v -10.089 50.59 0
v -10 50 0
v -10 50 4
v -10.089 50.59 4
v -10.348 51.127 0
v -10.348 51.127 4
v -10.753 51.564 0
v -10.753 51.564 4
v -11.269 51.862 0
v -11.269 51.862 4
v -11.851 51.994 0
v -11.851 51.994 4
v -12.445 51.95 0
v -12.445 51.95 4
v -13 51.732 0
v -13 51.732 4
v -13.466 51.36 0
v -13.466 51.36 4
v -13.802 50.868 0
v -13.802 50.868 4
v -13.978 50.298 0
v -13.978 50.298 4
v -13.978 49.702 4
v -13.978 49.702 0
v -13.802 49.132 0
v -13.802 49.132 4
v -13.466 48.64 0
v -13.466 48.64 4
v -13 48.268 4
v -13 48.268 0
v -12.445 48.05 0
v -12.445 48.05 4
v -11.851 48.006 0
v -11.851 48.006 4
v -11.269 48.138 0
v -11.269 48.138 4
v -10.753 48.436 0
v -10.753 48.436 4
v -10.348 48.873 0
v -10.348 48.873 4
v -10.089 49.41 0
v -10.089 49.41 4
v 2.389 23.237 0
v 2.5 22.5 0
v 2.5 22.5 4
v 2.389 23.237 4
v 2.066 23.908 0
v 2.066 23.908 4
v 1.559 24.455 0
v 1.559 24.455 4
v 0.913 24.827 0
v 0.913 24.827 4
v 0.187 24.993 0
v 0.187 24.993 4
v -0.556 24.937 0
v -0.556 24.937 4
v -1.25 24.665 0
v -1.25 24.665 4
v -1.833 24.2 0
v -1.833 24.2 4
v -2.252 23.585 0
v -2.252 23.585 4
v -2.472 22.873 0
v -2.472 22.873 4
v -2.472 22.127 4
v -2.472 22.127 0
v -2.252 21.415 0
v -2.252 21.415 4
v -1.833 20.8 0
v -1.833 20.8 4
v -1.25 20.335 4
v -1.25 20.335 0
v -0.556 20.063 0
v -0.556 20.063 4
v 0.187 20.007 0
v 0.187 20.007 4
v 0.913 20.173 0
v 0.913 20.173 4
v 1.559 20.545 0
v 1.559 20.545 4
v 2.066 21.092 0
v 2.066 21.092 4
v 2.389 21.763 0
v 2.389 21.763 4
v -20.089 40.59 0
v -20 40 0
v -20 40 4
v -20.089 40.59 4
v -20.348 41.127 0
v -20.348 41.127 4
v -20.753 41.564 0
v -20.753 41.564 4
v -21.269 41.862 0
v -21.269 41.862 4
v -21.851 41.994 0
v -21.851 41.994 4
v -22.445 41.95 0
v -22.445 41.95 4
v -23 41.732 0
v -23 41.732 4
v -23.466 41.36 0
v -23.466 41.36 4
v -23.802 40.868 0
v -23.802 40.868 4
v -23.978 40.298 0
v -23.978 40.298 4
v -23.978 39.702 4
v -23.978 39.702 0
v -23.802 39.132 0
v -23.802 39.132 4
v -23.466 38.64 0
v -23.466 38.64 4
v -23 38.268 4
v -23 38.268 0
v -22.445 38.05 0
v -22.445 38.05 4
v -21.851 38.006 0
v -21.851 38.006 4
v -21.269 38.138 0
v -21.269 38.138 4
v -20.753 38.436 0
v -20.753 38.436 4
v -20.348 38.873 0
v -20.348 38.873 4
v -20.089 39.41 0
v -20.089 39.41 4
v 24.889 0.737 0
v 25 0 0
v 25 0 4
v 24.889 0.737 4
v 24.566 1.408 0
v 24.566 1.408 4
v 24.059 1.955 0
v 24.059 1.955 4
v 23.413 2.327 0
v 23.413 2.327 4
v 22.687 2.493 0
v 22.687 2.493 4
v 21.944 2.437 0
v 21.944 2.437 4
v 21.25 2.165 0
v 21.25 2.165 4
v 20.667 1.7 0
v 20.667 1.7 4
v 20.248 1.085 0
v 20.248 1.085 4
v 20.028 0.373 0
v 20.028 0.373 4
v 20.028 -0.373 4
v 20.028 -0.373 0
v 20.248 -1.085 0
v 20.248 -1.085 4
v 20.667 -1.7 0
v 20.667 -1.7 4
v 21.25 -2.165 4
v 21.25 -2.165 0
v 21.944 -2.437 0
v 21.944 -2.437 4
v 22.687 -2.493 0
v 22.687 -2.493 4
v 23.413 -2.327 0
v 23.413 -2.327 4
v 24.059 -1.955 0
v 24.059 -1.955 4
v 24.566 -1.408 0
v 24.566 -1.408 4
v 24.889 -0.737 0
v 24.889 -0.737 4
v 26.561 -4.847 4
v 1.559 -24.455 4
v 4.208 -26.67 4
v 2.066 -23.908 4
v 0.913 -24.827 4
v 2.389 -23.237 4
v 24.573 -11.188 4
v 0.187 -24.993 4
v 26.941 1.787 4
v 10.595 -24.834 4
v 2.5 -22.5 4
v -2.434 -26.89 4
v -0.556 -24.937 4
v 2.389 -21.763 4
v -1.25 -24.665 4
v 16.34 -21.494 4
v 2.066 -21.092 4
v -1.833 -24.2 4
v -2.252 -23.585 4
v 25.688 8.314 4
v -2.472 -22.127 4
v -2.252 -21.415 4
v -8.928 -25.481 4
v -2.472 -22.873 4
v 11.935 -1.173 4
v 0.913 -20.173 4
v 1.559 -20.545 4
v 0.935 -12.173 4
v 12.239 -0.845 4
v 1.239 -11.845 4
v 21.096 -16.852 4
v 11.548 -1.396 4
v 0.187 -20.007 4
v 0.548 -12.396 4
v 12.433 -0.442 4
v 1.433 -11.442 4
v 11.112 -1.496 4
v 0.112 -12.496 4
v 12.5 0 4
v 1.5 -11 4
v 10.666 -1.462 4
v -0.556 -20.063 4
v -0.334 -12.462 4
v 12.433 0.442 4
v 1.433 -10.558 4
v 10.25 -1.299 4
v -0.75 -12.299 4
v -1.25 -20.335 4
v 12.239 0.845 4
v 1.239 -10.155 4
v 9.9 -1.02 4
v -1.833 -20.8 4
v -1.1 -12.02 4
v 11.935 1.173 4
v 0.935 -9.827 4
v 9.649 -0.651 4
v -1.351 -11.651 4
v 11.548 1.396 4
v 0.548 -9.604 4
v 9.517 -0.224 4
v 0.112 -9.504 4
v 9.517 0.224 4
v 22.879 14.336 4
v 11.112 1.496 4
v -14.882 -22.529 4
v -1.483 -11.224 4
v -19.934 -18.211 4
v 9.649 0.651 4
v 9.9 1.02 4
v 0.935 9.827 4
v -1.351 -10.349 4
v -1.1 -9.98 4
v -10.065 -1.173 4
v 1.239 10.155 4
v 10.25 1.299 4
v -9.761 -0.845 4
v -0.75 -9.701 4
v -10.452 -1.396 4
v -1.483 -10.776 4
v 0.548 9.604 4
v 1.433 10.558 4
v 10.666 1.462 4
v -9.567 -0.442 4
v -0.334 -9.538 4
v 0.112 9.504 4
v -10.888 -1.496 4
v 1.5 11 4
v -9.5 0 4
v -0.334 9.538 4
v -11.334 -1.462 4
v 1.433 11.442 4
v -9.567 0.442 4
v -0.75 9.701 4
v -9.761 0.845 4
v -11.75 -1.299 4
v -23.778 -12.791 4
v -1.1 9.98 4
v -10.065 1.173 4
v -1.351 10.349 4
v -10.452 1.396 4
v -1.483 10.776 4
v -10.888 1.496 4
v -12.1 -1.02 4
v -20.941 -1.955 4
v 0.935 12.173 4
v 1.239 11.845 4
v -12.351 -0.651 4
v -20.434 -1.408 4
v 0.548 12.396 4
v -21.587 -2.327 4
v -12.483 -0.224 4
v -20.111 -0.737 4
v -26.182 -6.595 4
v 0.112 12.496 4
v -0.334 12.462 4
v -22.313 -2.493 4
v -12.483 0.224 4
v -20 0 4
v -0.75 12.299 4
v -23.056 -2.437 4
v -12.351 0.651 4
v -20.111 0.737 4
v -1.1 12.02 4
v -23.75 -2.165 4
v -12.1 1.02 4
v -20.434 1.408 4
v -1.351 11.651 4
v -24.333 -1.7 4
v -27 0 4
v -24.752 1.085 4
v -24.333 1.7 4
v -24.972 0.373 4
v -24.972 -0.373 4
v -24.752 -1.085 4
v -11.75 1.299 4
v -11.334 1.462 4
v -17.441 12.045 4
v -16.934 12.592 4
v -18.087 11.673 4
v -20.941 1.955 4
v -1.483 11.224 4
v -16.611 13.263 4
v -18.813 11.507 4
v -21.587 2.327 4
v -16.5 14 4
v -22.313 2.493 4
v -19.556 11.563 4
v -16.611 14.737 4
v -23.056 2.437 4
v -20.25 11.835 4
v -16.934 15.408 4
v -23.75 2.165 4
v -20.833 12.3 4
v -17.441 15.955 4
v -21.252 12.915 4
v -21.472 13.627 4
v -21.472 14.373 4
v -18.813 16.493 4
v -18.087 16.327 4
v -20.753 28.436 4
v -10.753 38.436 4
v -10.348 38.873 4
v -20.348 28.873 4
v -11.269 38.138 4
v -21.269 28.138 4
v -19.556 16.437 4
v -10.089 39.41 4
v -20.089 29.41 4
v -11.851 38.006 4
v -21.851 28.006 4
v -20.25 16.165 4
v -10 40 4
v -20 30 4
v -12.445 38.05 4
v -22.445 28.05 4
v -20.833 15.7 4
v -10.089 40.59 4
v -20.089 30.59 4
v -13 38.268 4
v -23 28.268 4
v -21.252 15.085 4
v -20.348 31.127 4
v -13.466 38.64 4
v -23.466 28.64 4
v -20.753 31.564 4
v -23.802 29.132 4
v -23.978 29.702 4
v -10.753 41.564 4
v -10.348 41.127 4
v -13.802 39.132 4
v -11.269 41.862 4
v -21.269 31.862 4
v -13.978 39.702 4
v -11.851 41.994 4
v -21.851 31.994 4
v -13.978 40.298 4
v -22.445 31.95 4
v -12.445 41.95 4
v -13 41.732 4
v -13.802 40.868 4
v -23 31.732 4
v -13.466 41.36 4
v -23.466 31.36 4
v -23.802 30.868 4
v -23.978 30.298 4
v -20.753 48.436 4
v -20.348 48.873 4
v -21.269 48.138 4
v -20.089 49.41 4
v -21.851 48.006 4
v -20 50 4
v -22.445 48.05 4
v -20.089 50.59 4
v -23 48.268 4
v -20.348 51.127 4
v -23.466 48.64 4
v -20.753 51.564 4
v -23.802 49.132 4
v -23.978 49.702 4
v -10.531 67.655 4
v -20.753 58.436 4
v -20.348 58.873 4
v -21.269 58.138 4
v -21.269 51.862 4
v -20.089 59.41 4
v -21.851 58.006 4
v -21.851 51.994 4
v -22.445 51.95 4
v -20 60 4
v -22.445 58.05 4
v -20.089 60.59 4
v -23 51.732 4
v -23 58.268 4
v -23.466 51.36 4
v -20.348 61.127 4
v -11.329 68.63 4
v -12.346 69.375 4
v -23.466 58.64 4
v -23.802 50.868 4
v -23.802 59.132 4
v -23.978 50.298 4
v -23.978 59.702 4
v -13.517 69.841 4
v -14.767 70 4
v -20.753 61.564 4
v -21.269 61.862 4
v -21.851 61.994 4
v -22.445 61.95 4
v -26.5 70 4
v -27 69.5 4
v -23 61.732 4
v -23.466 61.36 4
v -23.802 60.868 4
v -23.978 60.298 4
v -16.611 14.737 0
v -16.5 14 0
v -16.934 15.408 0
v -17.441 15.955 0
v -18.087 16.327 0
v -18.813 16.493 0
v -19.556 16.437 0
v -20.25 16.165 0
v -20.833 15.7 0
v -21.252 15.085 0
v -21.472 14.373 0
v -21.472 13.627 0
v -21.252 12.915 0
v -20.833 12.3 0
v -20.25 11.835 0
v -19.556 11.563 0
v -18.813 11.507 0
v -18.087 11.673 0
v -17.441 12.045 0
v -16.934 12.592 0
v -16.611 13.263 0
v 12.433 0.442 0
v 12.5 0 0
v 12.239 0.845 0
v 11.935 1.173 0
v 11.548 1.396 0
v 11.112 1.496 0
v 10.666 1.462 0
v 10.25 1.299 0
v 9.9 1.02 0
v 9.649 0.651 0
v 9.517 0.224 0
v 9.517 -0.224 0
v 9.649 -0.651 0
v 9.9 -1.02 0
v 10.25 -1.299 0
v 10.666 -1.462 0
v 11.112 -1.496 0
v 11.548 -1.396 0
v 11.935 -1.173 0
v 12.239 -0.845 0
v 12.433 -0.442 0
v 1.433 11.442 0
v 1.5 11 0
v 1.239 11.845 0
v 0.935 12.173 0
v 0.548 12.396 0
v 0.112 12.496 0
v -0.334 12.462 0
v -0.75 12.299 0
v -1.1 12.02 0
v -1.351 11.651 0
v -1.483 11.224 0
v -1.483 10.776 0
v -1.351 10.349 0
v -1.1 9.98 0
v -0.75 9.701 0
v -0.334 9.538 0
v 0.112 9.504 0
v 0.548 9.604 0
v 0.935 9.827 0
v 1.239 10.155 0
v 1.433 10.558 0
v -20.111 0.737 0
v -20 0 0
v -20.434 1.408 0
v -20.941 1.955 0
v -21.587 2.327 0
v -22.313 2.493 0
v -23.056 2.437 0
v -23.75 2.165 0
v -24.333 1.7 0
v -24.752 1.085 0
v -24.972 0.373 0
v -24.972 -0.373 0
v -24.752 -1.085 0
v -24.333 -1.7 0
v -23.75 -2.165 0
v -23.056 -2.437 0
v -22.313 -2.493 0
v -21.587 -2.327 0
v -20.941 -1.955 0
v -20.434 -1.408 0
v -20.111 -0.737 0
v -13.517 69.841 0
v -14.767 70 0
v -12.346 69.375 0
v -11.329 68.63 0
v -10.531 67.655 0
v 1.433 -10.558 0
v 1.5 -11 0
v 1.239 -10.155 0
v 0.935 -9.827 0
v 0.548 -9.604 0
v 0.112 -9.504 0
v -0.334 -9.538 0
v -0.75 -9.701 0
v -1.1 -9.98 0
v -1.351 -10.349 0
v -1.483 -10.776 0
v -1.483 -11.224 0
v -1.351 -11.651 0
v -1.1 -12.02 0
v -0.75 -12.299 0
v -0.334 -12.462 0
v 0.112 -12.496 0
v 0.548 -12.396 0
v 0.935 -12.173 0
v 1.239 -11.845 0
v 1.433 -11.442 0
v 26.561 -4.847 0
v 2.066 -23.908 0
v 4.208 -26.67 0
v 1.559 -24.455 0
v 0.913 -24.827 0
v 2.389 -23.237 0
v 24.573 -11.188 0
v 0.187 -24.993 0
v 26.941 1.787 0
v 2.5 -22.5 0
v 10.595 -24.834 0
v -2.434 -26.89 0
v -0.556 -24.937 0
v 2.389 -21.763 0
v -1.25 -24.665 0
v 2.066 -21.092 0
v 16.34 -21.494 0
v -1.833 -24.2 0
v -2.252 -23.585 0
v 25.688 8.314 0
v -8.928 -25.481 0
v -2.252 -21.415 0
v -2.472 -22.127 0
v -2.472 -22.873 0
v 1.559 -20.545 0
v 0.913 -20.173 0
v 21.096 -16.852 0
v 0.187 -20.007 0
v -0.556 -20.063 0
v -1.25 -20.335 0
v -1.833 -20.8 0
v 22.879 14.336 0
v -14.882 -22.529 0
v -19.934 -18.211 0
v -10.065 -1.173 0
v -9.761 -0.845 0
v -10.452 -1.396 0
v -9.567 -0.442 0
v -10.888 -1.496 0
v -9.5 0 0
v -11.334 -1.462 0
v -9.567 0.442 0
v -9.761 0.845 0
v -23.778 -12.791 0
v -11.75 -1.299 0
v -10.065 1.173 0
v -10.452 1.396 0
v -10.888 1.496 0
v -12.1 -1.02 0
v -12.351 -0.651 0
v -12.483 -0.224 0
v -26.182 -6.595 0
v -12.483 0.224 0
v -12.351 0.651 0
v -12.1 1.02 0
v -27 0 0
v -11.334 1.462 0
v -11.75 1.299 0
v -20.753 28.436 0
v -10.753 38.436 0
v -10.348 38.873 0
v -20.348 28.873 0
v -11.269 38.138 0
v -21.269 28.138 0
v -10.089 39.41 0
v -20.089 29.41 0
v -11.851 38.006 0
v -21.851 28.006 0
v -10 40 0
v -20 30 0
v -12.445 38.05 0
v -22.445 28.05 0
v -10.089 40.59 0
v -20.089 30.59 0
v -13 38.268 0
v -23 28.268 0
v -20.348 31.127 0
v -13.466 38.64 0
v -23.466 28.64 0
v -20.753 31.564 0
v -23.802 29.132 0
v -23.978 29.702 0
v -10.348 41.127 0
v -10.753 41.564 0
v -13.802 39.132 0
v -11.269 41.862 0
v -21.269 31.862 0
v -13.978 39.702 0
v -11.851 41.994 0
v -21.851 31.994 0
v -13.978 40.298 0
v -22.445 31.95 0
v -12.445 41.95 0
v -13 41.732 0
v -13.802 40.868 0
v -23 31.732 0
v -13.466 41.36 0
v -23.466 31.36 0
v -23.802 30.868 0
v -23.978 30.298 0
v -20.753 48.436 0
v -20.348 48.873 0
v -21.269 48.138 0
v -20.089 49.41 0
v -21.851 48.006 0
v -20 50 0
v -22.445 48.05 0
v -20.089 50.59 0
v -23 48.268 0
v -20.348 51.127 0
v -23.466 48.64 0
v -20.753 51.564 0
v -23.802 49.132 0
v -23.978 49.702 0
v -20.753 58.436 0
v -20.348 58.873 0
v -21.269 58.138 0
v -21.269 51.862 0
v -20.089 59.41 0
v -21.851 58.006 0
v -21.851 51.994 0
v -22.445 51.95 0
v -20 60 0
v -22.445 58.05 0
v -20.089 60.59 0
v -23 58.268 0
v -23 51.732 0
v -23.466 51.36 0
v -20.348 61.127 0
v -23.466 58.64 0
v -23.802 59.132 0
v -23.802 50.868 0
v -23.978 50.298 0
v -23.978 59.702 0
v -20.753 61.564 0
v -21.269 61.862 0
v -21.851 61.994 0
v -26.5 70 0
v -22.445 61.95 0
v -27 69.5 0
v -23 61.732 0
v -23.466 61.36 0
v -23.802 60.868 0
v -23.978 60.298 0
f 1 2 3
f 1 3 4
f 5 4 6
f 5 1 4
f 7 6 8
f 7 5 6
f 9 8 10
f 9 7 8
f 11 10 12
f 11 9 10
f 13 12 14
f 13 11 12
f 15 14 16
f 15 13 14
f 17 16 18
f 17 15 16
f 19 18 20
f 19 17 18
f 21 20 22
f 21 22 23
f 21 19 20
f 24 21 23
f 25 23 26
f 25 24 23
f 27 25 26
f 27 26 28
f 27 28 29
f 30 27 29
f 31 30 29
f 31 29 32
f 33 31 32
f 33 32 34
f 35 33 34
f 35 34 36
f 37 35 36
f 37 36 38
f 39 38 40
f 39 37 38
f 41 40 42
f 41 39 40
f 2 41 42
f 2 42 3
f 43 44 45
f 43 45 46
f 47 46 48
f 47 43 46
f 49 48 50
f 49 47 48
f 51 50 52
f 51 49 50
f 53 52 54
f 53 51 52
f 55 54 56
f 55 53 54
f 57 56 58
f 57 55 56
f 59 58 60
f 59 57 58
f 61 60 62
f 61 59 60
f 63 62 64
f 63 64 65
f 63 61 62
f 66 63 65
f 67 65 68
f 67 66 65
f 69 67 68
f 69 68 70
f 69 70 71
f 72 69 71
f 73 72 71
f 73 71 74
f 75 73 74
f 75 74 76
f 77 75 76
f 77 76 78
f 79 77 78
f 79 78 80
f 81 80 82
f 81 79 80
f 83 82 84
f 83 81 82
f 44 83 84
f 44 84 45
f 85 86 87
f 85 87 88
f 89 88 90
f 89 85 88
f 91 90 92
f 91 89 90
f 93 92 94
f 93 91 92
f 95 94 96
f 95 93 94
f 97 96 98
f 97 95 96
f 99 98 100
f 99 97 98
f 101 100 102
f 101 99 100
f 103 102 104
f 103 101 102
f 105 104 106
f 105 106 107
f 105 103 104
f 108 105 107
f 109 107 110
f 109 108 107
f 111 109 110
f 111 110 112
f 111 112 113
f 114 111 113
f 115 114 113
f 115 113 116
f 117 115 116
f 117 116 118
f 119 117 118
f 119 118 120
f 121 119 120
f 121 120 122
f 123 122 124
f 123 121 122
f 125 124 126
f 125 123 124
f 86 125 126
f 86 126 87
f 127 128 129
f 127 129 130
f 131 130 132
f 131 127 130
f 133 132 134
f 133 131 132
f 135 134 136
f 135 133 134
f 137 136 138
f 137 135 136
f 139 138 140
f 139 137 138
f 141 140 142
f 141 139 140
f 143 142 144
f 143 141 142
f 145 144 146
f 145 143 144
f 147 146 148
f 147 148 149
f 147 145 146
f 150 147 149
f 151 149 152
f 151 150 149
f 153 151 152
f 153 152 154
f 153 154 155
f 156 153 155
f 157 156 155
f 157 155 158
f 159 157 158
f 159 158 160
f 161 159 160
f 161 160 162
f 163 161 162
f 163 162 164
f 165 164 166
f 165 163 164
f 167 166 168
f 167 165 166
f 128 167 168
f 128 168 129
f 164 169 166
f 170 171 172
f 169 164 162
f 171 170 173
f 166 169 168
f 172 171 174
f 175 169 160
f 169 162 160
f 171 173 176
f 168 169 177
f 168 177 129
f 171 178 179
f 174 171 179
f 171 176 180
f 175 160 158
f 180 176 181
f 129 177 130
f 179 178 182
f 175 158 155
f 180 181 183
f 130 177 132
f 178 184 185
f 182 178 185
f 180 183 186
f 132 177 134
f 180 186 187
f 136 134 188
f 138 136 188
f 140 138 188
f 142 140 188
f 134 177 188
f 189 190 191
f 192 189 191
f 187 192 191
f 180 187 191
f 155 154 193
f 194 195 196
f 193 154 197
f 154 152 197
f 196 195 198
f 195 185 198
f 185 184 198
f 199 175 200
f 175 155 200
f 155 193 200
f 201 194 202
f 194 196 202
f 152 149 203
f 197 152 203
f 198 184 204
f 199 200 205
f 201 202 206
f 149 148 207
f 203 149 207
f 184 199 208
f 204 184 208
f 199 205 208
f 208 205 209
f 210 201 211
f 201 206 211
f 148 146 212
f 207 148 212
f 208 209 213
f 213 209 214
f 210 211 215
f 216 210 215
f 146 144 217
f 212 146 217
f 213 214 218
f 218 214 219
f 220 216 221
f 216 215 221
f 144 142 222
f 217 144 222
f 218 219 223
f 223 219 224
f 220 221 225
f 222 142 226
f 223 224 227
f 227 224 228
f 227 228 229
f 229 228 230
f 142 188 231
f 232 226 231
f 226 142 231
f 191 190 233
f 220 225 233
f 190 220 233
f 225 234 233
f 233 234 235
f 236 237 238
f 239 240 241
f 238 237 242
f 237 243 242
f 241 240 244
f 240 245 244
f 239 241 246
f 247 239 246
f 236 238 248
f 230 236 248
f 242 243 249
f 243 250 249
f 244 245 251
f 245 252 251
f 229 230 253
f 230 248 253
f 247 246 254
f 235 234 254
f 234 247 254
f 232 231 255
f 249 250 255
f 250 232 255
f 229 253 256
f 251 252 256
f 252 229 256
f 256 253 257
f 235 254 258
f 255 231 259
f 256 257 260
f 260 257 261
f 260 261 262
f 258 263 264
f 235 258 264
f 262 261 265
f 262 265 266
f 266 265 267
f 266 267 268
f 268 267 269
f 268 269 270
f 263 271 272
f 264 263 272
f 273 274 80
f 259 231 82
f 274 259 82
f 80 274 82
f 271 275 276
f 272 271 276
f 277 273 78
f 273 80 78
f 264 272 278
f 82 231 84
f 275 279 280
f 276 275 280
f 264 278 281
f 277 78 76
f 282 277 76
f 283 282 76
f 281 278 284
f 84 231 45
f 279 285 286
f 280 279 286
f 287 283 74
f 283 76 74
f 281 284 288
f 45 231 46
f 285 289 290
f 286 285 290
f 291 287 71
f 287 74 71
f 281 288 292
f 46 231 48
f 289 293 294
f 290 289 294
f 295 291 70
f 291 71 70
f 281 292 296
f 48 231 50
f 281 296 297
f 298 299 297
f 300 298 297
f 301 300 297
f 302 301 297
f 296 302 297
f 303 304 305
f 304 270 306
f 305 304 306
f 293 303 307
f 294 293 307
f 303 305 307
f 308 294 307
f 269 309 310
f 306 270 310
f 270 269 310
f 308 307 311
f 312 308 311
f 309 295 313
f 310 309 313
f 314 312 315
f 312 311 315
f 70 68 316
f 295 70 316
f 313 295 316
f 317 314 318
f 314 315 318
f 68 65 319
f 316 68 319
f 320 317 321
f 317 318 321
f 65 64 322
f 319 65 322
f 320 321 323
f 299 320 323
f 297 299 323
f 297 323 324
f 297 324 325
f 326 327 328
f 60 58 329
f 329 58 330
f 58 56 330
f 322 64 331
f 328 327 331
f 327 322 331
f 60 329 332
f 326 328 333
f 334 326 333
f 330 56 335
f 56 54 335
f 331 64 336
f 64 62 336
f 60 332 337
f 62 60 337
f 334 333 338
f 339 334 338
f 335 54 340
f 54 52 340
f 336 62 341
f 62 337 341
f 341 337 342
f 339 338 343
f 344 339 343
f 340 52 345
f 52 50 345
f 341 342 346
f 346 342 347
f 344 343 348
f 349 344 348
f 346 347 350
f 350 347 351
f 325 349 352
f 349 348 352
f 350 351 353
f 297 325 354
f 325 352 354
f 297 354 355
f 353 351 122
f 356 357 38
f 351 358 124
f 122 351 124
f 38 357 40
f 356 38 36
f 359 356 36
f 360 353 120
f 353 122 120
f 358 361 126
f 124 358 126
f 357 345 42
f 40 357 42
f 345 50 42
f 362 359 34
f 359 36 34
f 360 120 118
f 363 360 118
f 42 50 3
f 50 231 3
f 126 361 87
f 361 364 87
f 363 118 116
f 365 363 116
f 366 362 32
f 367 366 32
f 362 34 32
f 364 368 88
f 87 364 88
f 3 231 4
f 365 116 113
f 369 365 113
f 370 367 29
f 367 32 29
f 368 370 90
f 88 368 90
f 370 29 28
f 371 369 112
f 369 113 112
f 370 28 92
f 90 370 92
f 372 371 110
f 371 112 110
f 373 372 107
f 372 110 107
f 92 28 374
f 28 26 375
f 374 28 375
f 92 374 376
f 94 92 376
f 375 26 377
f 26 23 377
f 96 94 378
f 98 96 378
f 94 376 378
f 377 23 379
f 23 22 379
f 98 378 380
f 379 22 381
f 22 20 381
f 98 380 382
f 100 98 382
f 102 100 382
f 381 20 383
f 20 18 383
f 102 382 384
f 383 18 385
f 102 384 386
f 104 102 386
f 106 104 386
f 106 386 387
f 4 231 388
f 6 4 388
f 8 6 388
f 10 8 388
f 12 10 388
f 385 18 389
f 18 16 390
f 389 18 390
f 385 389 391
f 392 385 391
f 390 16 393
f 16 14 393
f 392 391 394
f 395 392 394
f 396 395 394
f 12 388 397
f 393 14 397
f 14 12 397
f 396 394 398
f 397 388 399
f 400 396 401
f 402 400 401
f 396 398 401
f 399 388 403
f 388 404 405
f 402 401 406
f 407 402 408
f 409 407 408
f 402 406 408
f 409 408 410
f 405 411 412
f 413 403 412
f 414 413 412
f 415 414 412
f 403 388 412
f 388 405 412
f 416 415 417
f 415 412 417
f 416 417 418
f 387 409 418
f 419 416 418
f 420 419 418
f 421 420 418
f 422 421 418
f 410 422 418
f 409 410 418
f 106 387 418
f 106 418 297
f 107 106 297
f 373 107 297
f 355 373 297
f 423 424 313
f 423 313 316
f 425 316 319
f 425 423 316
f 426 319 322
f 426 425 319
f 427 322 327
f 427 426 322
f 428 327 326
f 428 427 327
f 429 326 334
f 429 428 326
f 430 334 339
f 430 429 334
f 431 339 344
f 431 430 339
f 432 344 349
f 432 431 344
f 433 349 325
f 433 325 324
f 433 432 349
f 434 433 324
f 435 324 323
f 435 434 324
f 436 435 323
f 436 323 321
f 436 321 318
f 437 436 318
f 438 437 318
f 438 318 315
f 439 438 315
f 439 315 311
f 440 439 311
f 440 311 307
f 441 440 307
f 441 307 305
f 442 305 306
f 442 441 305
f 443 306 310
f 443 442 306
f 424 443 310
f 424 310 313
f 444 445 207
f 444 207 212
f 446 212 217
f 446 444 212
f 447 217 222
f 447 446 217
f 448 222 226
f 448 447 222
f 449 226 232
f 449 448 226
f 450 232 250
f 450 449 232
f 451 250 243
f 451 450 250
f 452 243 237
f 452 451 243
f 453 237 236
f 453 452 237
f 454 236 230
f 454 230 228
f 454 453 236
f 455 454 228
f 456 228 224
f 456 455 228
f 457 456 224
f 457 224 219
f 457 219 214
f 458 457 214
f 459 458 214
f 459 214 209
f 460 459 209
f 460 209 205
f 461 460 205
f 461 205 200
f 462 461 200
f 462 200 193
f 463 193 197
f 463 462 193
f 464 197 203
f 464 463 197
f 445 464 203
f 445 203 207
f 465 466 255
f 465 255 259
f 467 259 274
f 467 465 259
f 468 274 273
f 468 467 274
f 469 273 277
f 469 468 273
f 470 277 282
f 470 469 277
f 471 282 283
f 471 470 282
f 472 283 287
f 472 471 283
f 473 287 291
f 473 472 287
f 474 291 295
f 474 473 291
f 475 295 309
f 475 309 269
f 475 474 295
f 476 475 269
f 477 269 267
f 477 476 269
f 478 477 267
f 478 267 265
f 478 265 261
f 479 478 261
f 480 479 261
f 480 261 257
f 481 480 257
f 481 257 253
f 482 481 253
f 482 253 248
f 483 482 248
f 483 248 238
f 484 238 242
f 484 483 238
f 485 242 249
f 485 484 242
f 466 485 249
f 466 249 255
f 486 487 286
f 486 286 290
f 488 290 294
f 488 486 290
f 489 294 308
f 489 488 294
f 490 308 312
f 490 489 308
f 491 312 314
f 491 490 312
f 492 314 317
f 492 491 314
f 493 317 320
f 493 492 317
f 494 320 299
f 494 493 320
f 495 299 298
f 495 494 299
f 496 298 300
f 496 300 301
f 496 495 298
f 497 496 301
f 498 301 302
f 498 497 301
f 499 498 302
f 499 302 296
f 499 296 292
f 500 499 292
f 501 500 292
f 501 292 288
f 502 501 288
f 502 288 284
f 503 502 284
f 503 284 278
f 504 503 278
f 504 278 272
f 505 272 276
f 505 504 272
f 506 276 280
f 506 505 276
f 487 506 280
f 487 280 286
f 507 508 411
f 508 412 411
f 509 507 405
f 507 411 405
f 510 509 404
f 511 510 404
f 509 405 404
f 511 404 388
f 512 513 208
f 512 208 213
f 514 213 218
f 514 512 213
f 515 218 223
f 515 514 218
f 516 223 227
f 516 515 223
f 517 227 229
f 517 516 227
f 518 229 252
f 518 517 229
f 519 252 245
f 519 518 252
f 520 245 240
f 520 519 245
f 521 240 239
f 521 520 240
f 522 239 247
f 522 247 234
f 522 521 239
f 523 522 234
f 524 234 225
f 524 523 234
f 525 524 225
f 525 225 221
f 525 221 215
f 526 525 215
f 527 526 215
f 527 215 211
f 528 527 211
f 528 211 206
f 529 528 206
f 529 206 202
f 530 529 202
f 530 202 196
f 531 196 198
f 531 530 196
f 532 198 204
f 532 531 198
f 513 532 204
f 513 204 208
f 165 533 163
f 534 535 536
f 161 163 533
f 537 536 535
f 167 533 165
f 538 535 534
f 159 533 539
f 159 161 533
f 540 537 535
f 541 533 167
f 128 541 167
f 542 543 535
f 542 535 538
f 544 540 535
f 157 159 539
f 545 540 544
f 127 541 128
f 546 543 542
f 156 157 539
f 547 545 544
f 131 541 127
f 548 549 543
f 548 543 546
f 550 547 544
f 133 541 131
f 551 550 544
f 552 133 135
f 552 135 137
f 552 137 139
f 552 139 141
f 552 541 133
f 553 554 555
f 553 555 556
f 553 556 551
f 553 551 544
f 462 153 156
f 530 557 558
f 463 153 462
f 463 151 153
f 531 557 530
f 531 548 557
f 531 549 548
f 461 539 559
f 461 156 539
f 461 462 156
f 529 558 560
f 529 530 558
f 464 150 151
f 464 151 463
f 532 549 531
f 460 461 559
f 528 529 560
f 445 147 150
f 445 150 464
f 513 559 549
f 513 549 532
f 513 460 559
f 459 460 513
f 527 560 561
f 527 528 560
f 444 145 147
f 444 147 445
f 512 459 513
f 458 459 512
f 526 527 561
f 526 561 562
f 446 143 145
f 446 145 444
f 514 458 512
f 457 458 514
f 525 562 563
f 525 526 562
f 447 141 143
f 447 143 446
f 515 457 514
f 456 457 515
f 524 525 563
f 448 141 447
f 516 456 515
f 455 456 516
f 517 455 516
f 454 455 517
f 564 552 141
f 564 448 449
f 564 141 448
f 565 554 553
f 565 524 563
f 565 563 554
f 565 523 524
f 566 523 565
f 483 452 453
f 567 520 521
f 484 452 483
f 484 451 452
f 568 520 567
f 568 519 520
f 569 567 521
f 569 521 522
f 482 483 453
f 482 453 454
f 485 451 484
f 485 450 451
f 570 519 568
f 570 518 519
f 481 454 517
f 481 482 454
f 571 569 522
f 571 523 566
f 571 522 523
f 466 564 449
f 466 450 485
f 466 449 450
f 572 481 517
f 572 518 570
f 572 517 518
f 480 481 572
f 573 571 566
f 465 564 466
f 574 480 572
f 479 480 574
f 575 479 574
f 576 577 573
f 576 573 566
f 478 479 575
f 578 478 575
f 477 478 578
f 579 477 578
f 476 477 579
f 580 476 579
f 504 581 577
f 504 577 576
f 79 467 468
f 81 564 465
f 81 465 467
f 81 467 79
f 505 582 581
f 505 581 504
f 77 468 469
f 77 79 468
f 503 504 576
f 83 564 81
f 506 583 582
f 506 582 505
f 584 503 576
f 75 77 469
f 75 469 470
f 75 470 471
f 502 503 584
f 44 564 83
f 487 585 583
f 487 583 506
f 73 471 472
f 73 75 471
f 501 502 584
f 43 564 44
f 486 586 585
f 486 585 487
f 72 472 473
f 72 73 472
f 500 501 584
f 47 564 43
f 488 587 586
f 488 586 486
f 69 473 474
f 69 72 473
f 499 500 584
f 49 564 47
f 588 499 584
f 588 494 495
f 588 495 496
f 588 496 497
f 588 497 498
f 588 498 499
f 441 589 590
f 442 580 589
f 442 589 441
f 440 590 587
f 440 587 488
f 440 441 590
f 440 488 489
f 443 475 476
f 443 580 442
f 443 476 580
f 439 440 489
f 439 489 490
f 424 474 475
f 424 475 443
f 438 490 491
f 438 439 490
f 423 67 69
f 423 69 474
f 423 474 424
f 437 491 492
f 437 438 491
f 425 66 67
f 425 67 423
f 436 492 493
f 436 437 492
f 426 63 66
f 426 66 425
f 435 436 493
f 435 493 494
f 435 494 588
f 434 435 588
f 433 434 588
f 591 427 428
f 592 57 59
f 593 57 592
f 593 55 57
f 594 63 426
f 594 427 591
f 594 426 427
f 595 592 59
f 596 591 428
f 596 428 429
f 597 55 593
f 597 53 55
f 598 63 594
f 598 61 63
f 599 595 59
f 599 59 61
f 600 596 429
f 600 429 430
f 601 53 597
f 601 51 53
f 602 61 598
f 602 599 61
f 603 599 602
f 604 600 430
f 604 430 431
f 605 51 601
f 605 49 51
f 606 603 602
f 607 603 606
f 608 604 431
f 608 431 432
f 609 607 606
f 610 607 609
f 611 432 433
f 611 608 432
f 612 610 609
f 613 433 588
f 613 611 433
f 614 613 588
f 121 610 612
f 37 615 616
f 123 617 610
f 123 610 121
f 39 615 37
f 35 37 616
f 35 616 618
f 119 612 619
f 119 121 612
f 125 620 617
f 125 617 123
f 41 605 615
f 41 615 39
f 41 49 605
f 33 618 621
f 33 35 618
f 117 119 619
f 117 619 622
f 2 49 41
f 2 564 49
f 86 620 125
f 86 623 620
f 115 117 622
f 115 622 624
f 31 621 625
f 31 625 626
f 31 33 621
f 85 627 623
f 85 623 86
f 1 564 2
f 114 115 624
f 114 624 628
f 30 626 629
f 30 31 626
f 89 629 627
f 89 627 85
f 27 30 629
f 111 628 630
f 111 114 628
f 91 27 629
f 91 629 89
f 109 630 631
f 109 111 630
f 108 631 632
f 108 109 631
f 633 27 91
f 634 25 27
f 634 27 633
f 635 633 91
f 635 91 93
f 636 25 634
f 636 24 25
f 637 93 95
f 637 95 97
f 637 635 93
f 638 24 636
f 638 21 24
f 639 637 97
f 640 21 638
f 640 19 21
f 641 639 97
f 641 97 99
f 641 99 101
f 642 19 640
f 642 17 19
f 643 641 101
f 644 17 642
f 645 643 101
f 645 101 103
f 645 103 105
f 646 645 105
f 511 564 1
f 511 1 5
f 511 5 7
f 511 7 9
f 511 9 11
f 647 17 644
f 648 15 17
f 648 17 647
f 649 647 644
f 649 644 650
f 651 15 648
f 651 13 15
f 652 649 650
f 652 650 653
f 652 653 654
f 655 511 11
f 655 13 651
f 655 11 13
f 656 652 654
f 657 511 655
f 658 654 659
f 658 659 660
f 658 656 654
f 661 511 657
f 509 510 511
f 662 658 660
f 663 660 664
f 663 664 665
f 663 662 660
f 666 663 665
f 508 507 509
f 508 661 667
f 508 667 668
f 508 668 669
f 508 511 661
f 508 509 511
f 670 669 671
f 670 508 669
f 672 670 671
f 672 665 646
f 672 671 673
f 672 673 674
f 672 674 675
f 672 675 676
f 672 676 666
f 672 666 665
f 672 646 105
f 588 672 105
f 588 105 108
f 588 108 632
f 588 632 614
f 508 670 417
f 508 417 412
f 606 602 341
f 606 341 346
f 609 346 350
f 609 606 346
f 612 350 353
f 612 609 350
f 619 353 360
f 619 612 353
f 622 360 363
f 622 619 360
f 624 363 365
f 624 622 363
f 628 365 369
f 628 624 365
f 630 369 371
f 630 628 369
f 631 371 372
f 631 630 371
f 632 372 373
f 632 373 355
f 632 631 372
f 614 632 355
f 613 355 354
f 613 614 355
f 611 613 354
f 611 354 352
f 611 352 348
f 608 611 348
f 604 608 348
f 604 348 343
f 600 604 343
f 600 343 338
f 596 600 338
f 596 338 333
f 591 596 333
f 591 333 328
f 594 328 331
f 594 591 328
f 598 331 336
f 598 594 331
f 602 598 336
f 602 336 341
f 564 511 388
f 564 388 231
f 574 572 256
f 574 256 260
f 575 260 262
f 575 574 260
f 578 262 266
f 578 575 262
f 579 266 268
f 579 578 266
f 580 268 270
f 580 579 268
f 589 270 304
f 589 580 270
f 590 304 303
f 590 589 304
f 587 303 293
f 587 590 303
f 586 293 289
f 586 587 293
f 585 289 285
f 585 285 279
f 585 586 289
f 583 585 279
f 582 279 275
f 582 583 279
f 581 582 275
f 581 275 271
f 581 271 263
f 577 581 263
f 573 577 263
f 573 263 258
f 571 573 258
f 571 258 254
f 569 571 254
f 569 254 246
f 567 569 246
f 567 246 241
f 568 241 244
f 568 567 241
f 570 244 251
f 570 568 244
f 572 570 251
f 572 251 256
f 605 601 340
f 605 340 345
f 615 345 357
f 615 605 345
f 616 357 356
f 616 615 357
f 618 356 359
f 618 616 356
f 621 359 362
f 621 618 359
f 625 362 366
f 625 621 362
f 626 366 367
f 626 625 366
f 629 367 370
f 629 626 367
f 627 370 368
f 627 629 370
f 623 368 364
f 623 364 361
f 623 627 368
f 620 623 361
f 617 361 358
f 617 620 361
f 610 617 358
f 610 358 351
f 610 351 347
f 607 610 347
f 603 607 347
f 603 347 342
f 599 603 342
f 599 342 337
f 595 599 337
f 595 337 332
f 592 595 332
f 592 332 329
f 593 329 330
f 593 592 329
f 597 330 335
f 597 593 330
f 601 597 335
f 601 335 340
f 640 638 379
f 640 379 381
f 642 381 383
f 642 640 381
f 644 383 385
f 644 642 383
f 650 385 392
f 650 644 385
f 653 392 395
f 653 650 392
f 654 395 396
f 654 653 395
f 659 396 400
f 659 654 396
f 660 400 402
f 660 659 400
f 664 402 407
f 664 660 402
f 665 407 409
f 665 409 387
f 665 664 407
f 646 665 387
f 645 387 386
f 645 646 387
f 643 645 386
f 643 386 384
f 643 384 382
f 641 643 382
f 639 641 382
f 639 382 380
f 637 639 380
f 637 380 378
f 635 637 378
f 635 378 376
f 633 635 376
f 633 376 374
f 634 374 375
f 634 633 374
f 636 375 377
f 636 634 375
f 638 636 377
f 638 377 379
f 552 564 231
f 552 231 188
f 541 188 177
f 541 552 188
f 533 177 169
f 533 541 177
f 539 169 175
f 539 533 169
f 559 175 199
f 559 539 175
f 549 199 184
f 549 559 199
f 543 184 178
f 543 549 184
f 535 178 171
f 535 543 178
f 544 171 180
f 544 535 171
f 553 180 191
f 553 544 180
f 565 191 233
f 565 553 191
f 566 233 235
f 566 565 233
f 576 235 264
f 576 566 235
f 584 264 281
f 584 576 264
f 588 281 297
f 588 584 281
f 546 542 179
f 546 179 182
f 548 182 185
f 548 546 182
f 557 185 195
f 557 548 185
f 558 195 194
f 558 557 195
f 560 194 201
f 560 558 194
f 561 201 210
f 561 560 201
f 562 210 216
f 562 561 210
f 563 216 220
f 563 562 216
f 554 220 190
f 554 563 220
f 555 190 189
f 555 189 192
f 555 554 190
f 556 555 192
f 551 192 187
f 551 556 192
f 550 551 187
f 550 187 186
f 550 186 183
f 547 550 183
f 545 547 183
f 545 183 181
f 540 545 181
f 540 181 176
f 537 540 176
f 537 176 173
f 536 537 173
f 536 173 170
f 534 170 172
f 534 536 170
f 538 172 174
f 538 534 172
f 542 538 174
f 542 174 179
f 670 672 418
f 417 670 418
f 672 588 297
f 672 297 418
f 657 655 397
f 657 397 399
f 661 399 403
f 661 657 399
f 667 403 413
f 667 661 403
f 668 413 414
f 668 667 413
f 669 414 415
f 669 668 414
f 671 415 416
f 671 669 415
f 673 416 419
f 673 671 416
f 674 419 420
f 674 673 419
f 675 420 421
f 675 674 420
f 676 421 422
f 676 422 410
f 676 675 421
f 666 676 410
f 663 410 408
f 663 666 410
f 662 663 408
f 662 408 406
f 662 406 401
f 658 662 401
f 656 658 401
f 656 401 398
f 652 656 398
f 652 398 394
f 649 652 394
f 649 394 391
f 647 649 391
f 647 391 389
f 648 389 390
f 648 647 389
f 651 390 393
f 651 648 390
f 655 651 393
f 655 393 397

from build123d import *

# Parameters (mm, degrees)
SKETCH_1_R      = 2.5
SKETCH_1_R_2    = 2
SKETCH_1_R_3    = 1.5
EXTRUDE_1_DEPTH = 4
FILLET_1_R      = 5
CHAMFER_1_SIZE  = 0.5


with BuildPart() as part:
    # 草图1 → 凸台-拉伸1 (new body)
    with BuildSketch(Plane.XY):
        with BuildLine():
            Line((-27, 0), (-27, 70))
            Line((-27, 70), (-11.999997176, 70))
            Line((-11.999997176, 70), (22.879375353, 14.336463423))
            ThreePointArc((22.879375353, 14.336463423), (7.458447073, -25.949403987), (-27, 0))
        make_face()
        with Locations((0, 22.5)):
            Circle(SKETCH_1_R, mode=Mode.SUBTRACT)
        with Locations((22.5, 0)):
            Circle(SKETCH_1_R, mode=Mode.SUBTRACT)
        with Locations((0, -22.5)):
            Circle(SKETCH_1_R, mode=Mode.SUBTRACT)
        with Locations((-22.5, 0)):
            Circle(SKETCH_1_R, mode=Mode.SUBTRACT)
        with Locations((-22, 60)):
            Circle(SKETCH_1_R_2, mode=Mode.SUBTRACT)
        with Locations((-22, 50)):
            Circle(SKETCH_1_R_2, mode=Mode.SUBTRACT)
        with Locations((-22, 30)):
            Circle(SKETCH_1_R_2, mode=Mode.SUBTRACT)
        with Locations((-22, 40)):
            Circle(SKETCH_1_R_2, mode=Mode.SUBTRACT)
        with Locations((-12, 50)):
            Circle(SKETCH_1_R_2, mode=Mode.SUBTRACT)
        with Locations((0, 11)):
            Circle(SKETCH_1_R_3, mode=Mode.SUBTRACT)
        with Locations((11, 0)):
            Circle(SKETCH_1_R_3, mode=Mode.SUBTRACT)
        with Locations((0, -11)):
            Circle(SKETCH_1_R_3, mode=Mode.SUBTRACT)
        with Locations((-11, 0)):
            Circle(SKETCH_1_R_3, mode=Mode.SUBTRACT)
        with Locations((-12, 40)):
            Circle(SKETCH_1_R_2, mode=Mode.SUBTRACT)
        with Locations((-19, 14)):
            Circle(SKETCH_1_R, mode=Mode.SUBTRACT)
    extrude(amount=EXTRUDE_1_DEPTH)

    # 圆角1
    fillet_1_edges = [part.edges().sort_by_distance(p)[0] for p in [
        (-11.999997176, 70, 2),
    ]]
    fillet(fillet_1_edges, radius=FILLET_1_R)

    # 倒角1
    chamfer_1_edges = [part.edges().sort_by_distance(p)[0] for p in [
        (-27, 70, 2),
    ]]
    chamfer(chamfer_1_edges, length=CHAMFER_1_SIZE)


solid = part.part
